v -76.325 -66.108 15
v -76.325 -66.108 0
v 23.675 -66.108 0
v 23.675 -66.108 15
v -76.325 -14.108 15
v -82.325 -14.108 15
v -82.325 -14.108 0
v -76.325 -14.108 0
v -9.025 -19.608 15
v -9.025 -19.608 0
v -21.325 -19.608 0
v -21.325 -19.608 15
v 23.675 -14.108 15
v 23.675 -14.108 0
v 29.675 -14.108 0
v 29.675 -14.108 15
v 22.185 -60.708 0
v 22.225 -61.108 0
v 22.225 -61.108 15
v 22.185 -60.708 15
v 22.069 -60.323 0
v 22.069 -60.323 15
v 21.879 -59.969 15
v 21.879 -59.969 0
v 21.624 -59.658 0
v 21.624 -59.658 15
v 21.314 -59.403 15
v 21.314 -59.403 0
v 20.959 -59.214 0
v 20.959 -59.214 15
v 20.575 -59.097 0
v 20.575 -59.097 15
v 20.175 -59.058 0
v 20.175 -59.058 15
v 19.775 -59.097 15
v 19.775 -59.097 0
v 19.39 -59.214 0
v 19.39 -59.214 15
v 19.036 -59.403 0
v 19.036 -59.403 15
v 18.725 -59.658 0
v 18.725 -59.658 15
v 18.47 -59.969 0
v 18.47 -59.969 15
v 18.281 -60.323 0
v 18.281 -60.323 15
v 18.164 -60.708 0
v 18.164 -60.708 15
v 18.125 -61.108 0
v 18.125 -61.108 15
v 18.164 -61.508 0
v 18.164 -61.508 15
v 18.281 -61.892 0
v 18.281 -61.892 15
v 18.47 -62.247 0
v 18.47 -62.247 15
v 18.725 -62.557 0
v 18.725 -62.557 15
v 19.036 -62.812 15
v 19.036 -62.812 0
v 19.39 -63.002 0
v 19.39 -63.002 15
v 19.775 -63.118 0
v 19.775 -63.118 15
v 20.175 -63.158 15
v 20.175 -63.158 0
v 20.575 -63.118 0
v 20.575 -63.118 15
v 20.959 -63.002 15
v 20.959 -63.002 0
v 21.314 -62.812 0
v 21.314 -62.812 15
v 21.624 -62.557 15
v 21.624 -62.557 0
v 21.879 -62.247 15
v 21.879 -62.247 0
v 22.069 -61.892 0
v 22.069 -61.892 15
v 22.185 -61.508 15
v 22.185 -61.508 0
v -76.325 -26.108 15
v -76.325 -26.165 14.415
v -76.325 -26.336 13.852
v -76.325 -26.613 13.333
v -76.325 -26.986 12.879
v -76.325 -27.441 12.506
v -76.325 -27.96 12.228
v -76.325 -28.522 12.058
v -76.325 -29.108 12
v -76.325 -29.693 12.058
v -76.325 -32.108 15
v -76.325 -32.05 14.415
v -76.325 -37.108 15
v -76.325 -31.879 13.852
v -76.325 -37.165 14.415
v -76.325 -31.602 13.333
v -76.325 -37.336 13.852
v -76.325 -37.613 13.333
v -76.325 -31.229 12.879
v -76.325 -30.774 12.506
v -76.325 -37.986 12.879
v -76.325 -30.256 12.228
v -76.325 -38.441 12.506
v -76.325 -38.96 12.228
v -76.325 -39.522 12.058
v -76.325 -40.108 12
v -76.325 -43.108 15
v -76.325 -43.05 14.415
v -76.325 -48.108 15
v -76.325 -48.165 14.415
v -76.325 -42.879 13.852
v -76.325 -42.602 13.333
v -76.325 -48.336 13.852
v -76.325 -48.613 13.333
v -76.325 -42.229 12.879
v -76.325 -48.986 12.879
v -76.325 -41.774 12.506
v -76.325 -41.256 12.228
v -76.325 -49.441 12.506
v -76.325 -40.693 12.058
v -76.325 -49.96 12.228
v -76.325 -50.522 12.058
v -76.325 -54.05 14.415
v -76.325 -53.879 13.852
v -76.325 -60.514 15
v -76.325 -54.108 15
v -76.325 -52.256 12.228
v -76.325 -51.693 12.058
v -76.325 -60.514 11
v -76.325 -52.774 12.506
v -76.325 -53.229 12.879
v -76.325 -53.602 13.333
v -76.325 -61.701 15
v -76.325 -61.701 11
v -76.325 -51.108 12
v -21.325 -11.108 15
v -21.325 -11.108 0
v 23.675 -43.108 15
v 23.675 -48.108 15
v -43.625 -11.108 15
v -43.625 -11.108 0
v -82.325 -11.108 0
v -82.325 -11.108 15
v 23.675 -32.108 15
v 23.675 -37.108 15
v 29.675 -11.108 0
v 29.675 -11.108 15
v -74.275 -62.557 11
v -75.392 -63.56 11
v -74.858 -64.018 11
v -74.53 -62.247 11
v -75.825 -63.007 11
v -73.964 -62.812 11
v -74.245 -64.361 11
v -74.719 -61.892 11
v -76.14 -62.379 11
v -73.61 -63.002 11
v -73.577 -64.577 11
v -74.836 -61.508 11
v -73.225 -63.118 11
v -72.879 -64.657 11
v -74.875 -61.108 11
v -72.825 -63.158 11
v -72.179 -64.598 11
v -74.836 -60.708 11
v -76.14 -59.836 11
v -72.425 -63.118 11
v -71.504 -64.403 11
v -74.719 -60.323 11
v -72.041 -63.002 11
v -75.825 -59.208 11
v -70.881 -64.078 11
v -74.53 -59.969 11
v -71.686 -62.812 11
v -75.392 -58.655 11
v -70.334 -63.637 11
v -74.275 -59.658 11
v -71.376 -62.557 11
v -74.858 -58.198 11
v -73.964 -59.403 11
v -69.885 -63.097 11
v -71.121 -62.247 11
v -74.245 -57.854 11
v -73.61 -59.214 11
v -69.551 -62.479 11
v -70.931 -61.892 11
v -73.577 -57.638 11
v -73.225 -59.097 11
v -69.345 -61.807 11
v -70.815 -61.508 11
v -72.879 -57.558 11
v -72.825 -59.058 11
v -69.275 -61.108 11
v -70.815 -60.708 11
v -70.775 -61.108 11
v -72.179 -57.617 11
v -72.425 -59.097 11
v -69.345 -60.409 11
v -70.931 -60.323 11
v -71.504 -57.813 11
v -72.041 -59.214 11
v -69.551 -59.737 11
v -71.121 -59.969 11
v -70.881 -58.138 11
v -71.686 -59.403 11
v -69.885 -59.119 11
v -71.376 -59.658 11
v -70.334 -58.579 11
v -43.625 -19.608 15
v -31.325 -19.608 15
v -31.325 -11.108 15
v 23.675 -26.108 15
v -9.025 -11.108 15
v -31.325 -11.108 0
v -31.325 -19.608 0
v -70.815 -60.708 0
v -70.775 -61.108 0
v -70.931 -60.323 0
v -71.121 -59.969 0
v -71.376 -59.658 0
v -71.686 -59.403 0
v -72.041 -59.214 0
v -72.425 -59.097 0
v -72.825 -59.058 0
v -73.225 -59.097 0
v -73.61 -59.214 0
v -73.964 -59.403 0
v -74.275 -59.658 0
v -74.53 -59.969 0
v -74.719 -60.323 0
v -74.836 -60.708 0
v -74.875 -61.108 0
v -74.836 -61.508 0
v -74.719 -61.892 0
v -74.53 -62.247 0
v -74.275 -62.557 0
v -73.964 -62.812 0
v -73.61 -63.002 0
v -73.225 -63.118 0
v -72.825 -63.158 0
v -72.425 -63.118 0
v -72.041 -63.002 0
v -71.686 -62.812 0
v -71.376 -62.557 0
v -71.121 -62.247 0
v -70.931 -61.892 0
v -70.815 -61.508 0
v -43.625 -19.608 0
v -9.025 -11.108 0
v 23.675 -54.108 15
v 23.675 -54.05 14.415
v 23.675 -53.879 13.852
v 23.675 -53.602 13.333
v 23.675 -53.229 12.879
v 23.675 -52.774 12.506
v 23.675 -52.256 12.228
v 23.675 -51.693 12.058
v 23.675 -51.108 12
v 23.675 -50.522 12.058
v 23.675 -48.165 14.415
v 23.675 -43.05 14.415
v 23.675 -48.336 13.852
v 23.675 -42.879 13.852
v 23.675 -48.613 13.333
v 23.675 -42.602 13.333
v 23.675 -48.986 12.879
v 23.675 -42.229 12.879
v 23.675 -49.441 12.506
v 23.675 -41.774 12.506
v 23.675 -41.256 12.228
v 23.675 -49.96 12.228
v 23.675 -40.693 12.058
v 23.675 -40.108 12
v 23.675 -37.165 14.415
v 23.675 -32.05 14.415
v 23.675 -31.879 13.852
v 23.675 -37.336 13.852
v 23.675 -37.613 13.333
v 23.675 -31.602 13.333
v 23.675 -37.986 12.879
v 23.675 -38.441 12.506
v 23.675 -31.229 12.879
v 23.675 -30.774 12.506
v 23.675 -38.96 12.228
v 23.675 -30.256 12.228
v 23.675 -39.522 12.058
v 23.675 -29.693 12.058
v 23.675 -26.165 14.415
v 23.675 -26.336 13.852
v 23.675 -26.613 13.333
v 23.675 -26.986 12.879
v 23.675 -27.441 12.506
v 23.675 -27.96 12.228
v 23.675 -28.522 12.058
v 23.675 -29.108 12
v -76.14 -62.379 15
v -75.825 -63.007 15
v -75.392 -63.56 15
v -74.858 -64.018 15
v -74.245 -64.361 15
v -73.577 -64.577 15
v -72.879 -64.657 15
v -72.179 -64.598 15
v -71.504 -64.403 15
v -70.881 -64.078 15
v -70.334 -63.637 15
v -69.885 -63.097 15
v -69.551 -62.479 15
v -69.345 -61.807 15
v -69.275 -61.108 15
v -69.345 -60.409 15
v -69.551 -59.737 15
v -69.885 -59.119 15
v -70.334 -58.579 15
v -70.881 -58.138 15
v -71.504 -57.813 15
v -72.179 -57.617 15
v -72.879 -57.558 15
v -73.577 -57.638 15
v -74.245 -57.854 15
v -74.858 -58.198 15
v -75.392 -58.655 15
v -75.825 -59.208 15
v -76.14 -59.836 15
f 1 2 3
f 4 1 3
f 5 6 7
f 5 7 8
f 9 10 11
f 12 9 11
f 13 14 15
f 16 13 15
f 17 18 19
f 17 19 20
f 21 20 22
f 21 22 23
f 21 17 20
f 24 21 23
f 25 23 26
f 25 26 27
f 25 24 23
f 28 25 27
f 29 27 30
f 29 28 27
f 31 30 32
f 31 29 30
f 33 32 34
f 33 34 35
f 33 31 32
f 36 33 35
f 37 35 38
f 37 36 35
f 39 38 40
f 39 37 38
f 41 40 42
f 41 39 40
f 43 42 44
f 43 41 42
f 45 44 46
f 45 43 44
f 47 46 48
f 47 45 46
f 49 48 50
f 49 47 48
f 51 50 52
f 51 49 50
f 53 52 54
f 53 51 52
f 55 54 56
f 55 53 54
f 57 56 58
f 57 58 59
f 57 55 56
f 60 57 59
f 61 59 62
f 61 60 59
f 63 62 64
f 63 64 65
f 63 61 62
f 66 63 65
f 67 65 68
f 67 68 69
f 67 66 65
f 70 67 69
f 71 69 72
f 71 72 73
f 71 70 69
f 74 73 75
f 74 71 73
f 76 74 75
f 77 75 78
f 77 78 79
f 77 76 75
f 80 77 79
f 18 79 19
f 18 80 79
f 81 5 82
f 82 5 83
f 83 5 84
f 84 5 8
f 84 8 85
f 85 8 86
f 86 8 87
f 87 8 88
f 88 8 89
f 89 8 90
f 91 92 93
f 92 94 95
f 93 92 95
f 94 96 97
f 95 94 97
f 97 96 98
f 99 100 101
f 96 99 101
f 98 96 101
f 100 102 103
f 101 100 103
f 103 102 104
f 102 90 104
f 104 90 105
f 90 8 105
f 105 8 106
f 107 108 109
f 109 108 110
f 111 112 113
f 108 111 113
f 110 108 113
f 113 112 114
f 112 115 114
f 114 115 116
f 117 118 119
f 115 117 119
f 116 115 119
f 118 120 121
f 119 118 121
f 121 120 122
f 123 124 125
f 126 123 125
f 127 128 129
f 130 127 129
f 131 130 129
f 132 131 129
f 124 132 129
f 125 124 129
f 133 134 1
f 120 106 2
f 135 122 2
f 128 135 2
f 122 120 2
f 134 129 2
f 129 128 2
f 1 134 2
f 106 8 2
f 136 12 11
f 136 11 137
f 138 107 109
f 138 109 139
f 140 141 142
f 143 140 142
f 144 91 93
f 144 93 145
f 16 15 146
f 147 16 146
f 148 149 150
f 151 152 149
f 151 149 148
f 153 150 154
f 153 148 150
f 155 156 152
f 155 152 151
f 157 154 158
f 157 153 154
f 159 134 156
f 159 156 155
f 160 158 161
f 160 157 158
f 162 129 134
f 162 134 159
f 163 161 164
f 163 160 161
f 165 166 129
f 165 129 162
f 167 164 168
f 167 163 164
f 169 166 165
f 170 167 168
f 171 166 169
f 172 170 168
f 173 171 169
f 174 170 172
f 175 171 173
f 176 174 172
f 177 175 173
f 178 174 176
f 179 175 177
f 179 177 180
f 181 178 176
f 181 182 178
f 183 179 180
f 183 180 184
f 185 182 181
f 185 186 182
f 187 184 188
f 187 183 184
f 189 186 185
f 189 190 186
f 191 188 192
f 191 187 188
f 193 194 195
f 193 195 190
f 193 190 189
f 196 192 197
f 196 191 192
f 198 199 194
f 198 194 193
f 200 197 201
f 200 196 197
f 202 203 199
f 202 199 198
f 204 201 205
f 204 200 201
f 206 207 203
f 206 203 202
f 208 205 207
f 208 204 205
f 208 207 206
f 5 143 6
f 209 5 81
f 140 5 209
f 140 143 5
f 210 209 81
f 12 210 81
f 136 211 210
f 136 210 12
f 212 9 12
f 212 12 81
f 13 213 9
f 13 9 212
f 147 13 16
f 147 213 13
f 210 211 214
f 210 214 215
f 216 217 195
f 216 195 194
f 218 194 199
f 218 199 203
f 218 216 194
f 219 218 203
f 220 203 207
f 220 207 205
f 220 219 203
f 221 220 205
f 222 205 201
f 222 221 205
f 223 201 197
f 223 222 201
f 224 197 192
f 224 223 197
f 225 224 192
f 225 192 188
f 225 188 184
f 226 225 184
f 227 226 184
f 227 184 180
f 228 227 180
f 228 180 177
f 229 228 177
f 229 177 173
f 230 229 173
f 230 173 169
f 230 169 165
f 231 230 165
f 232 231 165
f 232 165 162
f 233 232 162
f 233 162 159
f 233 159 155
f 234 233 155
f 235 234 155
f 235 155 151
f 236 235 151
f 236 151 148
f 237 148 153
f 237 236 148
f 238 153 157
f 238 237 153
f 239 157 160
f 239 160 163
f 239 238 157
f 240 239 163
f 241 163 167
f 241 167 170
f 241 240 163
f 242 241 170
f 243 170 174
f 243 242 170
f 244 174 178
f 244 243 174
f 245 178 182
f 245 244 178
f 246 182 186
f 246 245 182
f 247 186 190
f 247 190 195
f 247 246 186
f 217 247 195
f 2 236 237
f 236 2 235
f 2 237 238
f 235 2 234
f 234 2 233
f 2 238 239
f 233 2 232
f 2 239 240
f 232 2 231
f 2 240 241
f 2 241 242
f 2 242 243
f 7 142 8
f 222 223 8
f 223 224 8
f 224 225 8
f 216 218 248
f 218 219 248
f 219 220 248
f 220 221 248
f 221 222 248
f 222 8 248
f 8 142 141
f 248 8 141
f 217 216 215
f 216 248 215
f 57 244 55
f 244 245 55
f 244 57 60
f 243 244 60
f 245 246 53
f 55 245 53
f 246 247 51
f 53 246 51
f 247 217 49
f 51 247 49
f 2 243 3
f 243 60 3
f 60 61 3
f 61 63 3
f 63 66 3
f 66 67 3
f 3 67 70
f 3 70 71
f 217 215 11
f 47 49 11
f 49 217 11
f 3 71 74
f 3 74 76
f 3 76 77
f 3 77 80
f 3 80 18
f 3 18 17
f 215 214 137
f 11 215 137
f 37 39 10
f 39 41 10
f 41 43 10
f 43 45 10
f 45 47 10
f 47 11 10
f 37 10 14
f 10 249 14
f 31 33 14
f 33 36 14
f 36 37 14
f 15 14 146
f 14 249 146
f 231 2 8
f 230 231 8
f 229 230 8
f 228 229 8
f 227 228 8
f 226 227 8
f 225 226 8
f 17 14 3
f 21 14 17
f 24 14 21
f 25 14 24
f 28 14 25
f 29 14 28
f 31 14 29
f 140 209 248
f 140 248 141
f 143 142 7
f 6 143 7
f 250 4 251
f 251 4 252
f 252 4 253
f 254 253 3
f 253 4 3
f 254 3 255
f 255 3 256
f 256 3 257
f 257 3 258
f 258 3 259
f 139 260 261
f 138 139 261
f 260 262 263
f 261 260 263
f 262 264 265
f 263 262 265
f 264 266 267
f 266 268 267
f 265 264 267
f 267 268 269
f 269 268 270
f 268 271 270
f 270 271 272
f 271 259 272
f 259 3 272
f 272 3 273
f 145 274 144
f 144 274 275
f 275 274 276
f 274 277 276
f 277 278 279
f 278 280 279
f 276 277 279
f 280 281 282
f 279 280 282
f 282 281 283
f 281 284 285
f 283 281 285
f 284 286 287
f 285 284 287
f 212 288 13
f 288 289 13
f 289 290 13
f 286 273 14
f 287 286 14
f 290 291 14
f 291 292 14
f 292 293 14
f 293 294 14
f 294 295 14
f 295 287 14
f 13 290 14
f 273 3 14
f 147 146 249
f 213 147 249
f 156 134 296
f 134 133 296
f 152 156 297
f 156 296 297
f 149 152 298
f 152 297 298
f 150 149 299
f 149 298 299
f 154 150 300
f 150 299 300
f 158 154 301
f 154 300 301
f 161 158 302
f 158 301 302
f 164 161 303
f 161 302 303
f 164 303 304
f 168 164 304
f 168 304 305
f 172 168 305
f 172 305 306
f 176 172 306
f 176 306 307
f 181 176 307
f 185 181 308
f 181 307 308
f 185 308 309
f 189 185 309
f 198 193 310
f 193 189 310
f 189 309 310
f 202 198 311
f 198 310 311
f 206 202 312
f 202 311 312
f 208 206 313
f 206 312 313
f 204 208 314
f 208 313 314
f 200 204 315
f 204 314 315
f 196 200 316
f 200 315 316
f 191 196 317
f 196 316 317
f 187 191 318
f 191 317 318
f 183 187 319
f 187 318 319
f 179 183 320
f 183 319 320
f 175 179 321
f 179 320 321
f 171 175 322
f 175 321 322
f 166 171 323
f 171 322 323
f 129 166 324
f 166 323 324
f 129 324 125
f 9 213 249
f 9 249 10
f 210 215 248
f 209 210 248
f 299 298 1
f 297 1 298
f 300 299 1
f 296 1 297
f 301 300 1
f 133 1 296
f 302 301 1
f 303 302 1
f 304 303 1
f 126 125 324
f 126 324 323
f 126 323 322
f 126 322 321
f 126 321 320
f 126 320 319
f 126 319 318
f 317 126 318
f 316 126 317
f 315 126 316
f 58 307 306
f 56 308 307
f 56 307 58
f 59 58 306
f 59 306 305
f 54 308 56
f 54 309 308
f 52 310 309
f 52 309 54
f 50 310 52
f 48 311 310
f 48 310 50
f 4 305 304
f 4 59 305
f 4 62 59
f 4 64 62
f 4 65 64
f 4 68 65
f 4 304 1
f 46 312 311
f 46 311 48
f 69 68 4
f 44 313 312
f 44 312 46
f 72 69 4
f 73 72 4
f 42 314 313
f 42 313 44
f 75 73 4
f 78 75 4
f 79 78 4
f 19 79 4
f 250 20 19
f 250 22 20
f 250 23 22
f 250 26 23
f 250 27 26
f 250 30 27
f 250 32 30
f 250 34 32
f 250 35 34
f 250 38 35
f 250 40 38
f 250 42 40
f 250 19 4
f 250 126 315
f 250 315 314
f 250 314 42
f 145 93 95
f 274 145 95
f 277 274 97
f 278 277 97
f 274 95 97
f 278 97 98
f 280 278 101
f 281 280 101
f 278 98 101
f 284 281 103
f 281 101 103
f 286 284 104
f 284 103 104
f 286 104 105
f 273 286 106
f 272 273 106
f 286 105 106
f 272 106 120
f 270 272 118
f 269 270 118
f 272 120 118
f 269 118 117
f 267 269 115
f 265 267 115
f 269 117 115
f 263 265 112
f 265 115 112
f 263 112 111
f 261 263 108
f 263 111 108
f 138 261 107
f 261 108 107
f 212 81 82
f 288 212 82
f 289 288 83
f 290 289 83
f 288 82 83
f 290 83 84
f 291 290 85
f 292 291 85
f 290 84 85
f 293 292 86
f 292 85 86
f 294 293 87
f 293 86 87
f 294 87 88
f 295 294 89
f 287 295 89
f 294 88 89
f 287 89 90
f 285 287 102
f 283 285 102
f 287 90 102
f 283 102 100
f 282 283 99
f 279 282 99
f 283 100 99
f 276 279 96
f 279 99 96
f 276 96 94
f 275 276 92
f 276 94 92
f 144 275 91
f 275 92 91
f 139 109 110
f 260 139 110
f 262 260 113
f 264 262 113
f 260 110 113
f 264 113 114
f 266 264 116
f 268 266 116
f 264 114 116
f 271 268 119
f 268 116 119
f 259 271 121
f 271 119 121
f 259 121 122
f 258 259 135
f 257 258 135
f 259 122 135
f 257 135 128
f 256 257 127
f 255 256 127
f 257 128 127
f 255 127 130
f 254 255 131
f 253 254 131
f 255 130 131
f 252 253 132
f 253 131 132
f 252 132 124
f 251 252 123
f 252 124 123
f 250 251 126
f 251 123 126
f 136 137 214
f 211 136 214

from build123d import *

# Parameters (mm, degrees)
F0_R     = 2.05
F1_DEPTH = 15
F2_R     = 3
F3_DEPTH = 121
F4_R     = 3.55
F4_R_2   = 2.05
F5_DEPTH = 4


with BuildPart() as f1:
    # F0 (on Top) → F1 (new body)
    with BuildSketch(Plane.XY):
        Polygon((-43.625293, -11.107708), (-82.325293, -11.107708), (-82.325293, -14.107708), (-76.325293, -14.107708), (-76.325293, -66.107708), (23.674707, -66.107708), (23.674707, -14.107708), (29.674707, -14.107708), (29.674707, -11.107708), (-9.025293, -11.107708), (-9.025293, -19.607708), (-21.325293, -19.607708), (-21.325293, -11.107708), (-31.325293, -11.107708), (-31.325293, -19.607708), (-43.625293, -19.607708), align=None)
        with Locations((-72.825293, -61.107708)):
            Circle(F0_R, mode=Mode.SUBTRACT)
        with Locations((20.174707, -61.107708)):
            Circle(F0_R, mode=Mode.SUBTRACT)
    extrude(amount=F1_DEPTH)

    # F2 (on face) → F3 (cut)
    with BuildSketch(Plane(origin=(-76.325293, 0, 0), x_dir=(0, -1, 0), z_dir=(-1, 0, 0))):
        with Locations((29.107708, 15)):
            Circle(F2_R)
        with Locations((51.107708, 15)):
            Circle(F2_R)
        with Locations((40.107708, 15)):
            Circle(F2_R)
    extrude(amount=-F3_DEPTH, mode=Mode.SUBTRACT)

    # F4 (on face) → F5 (cut)
    with BuildSketch(Plane.XY.offset(15)):
        with Locations((-72.825293, -61.107708)):
            Circle(F4_R)
        with Locations((-72.825293, -61.107708)):
            Circle(F4_R_2, mode=Mode.SUBTRACT)
    extrude(amount=-F5_DEPTH, mode=Mode.SUBTRACT)


solid = f1.part
